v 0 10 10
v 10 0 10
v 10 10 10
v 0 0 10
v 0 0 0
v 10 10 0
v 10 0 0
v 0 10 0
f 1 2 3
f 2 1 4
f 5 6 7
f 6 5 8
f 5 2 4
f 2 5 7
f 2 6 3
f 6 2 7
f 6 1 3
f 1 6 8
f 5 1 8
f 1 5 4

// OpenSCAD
// file: utils/build_plate.scad
// Build Plate representation module
// Made by Makerbot (http://curriculum.makerbot.com/daily_lessons/february/openscad_buildplate.html)

//use this to include a build plate visualization in your openSCAD scripts. Very useful for things designed to be edited in Makerbot Customizer

//to use, either include or use <utils/build_plate.scad>

//then just call build_plate(); with the following arguments (also, you have to have a real object in your scene for this to render)

//putting 0 as the first argument will give you a Replicator 2 build plate
//putting 1 as the first argument will give you a Replicator 1 build plate
//putting 2 as the first argument will give you a Thingomatic build plate
//putting 3 as the first argument will give you a manually adjustable build plate (note: if you use this option, you need to specify your build plates X length (in mm) as the second argument and the Y length (in mm) as the third argument. eg. build_plate(3,150,120);)

/*

to give your user control of which build plate they see in Customizer, include the following code:

use <utils/build_plate.scad>

//for display only, doesn't contribute to final object
build_plate_selector = 0; //[0:Replicator 2,1: Replicator,2:Thingomatic,3:Manual]
//when Build Plate Selector is set to "manual" this controls the build plate x dimension
build_plate_manual_x = 100; //[100:400]
//when Build Plate Selector is set to "manual" this controls the build plate y dimension
build_plate_manual_y = 100; //[100:400]

build_plate(build_plate_selector,build_plate_manual_x,build_plate_manual_y);

*/




//to see how this works, uncomment the following code

//build_plate_selector = 0; //[0:Replicator 2,1: Replicator,2:Thingomatic,3:Manual]
//build_plate_manual_x = 100; //[100:400]
//build_plate_manual_y = 100; //[100:400]
//
//build_plate(build_plate_selector,build_plate_manual_x,build_plate_manual_y);
//
//cube(5);


module build_plate(bp,manX,manY){

		translate([0,0,-.52]){
			if(bp == 0){
				%cube([285,153,1],center = true);
			}
			if(bp == 1){
				%cube([225,145,1],center = true);
			}
			if(bp == 2){
				%cube([120,120,1],center = true);
			}
			if(bp == 3){
				%cube([manX,manY,1],center = true);
			}
		
		}
		translate([0,0,-.5]){
			if(bp == 0){
				for(i = [-14:14]){
					translate([i*10,0,0])
					%cube([.5,153,1.01],center = true);
				}
				for(i = [-7:7]){
					translate([0,i*10,0])
					%cube([285,.5,1.01],center = true);
				}	
			}
			if(bp == 1){
				for(i = [-11:11]){
					translate([i*10,0,0])
						%cube([.5,145,1.01],center = true);
				}
				for(i = [-7:7]){
					translate([0,i*10,0])
						%cube([225,.5,1.01],center = true);
				}
			}
			if(bp == 2){
				for(i = [-6:6]){
					translate([i*10,0,0])
						%cube([.5,120,1.01],center = true);
				}
				for(i = [-6:6]){
					translate([0,i*10,0])
						%cube([120,.5,1.01],center = true);
				}
			}
			if(bp == 3){
				for(i = [-(floor(manX/20)):floor(manX/20)]){
					translate([i*10,0,0])
						%cube([.5,manY,1.01],center = true);
				}
				for(i = [-(floor(manY/20)):floor(manY/20)]){
					translate([0,i*10,0])
						%cube([manX,.5,1.01],center = true);
				}
			}
		}
}
// main file
use <./utils/build_plate.scad> // Cuadricula transparente para la base
build_plate(3, 200,100); // No se incluye al renderizar


//----------------------------------------------------------
//-- Tutorial OpenScad
//-- Juan Gonzalez-Gomez (Obijuan) juan@iearobotics.com
//----------------------------------------------------------
//-- (c) Mayo, 2012
//-- Licencia GPL
//----------------------------------------------------------
//-- Construccion del cubo "hola mundo"
//----------------------------------------------------------

//-- Cubo Hola Mundo
cube([10,10,10]);
